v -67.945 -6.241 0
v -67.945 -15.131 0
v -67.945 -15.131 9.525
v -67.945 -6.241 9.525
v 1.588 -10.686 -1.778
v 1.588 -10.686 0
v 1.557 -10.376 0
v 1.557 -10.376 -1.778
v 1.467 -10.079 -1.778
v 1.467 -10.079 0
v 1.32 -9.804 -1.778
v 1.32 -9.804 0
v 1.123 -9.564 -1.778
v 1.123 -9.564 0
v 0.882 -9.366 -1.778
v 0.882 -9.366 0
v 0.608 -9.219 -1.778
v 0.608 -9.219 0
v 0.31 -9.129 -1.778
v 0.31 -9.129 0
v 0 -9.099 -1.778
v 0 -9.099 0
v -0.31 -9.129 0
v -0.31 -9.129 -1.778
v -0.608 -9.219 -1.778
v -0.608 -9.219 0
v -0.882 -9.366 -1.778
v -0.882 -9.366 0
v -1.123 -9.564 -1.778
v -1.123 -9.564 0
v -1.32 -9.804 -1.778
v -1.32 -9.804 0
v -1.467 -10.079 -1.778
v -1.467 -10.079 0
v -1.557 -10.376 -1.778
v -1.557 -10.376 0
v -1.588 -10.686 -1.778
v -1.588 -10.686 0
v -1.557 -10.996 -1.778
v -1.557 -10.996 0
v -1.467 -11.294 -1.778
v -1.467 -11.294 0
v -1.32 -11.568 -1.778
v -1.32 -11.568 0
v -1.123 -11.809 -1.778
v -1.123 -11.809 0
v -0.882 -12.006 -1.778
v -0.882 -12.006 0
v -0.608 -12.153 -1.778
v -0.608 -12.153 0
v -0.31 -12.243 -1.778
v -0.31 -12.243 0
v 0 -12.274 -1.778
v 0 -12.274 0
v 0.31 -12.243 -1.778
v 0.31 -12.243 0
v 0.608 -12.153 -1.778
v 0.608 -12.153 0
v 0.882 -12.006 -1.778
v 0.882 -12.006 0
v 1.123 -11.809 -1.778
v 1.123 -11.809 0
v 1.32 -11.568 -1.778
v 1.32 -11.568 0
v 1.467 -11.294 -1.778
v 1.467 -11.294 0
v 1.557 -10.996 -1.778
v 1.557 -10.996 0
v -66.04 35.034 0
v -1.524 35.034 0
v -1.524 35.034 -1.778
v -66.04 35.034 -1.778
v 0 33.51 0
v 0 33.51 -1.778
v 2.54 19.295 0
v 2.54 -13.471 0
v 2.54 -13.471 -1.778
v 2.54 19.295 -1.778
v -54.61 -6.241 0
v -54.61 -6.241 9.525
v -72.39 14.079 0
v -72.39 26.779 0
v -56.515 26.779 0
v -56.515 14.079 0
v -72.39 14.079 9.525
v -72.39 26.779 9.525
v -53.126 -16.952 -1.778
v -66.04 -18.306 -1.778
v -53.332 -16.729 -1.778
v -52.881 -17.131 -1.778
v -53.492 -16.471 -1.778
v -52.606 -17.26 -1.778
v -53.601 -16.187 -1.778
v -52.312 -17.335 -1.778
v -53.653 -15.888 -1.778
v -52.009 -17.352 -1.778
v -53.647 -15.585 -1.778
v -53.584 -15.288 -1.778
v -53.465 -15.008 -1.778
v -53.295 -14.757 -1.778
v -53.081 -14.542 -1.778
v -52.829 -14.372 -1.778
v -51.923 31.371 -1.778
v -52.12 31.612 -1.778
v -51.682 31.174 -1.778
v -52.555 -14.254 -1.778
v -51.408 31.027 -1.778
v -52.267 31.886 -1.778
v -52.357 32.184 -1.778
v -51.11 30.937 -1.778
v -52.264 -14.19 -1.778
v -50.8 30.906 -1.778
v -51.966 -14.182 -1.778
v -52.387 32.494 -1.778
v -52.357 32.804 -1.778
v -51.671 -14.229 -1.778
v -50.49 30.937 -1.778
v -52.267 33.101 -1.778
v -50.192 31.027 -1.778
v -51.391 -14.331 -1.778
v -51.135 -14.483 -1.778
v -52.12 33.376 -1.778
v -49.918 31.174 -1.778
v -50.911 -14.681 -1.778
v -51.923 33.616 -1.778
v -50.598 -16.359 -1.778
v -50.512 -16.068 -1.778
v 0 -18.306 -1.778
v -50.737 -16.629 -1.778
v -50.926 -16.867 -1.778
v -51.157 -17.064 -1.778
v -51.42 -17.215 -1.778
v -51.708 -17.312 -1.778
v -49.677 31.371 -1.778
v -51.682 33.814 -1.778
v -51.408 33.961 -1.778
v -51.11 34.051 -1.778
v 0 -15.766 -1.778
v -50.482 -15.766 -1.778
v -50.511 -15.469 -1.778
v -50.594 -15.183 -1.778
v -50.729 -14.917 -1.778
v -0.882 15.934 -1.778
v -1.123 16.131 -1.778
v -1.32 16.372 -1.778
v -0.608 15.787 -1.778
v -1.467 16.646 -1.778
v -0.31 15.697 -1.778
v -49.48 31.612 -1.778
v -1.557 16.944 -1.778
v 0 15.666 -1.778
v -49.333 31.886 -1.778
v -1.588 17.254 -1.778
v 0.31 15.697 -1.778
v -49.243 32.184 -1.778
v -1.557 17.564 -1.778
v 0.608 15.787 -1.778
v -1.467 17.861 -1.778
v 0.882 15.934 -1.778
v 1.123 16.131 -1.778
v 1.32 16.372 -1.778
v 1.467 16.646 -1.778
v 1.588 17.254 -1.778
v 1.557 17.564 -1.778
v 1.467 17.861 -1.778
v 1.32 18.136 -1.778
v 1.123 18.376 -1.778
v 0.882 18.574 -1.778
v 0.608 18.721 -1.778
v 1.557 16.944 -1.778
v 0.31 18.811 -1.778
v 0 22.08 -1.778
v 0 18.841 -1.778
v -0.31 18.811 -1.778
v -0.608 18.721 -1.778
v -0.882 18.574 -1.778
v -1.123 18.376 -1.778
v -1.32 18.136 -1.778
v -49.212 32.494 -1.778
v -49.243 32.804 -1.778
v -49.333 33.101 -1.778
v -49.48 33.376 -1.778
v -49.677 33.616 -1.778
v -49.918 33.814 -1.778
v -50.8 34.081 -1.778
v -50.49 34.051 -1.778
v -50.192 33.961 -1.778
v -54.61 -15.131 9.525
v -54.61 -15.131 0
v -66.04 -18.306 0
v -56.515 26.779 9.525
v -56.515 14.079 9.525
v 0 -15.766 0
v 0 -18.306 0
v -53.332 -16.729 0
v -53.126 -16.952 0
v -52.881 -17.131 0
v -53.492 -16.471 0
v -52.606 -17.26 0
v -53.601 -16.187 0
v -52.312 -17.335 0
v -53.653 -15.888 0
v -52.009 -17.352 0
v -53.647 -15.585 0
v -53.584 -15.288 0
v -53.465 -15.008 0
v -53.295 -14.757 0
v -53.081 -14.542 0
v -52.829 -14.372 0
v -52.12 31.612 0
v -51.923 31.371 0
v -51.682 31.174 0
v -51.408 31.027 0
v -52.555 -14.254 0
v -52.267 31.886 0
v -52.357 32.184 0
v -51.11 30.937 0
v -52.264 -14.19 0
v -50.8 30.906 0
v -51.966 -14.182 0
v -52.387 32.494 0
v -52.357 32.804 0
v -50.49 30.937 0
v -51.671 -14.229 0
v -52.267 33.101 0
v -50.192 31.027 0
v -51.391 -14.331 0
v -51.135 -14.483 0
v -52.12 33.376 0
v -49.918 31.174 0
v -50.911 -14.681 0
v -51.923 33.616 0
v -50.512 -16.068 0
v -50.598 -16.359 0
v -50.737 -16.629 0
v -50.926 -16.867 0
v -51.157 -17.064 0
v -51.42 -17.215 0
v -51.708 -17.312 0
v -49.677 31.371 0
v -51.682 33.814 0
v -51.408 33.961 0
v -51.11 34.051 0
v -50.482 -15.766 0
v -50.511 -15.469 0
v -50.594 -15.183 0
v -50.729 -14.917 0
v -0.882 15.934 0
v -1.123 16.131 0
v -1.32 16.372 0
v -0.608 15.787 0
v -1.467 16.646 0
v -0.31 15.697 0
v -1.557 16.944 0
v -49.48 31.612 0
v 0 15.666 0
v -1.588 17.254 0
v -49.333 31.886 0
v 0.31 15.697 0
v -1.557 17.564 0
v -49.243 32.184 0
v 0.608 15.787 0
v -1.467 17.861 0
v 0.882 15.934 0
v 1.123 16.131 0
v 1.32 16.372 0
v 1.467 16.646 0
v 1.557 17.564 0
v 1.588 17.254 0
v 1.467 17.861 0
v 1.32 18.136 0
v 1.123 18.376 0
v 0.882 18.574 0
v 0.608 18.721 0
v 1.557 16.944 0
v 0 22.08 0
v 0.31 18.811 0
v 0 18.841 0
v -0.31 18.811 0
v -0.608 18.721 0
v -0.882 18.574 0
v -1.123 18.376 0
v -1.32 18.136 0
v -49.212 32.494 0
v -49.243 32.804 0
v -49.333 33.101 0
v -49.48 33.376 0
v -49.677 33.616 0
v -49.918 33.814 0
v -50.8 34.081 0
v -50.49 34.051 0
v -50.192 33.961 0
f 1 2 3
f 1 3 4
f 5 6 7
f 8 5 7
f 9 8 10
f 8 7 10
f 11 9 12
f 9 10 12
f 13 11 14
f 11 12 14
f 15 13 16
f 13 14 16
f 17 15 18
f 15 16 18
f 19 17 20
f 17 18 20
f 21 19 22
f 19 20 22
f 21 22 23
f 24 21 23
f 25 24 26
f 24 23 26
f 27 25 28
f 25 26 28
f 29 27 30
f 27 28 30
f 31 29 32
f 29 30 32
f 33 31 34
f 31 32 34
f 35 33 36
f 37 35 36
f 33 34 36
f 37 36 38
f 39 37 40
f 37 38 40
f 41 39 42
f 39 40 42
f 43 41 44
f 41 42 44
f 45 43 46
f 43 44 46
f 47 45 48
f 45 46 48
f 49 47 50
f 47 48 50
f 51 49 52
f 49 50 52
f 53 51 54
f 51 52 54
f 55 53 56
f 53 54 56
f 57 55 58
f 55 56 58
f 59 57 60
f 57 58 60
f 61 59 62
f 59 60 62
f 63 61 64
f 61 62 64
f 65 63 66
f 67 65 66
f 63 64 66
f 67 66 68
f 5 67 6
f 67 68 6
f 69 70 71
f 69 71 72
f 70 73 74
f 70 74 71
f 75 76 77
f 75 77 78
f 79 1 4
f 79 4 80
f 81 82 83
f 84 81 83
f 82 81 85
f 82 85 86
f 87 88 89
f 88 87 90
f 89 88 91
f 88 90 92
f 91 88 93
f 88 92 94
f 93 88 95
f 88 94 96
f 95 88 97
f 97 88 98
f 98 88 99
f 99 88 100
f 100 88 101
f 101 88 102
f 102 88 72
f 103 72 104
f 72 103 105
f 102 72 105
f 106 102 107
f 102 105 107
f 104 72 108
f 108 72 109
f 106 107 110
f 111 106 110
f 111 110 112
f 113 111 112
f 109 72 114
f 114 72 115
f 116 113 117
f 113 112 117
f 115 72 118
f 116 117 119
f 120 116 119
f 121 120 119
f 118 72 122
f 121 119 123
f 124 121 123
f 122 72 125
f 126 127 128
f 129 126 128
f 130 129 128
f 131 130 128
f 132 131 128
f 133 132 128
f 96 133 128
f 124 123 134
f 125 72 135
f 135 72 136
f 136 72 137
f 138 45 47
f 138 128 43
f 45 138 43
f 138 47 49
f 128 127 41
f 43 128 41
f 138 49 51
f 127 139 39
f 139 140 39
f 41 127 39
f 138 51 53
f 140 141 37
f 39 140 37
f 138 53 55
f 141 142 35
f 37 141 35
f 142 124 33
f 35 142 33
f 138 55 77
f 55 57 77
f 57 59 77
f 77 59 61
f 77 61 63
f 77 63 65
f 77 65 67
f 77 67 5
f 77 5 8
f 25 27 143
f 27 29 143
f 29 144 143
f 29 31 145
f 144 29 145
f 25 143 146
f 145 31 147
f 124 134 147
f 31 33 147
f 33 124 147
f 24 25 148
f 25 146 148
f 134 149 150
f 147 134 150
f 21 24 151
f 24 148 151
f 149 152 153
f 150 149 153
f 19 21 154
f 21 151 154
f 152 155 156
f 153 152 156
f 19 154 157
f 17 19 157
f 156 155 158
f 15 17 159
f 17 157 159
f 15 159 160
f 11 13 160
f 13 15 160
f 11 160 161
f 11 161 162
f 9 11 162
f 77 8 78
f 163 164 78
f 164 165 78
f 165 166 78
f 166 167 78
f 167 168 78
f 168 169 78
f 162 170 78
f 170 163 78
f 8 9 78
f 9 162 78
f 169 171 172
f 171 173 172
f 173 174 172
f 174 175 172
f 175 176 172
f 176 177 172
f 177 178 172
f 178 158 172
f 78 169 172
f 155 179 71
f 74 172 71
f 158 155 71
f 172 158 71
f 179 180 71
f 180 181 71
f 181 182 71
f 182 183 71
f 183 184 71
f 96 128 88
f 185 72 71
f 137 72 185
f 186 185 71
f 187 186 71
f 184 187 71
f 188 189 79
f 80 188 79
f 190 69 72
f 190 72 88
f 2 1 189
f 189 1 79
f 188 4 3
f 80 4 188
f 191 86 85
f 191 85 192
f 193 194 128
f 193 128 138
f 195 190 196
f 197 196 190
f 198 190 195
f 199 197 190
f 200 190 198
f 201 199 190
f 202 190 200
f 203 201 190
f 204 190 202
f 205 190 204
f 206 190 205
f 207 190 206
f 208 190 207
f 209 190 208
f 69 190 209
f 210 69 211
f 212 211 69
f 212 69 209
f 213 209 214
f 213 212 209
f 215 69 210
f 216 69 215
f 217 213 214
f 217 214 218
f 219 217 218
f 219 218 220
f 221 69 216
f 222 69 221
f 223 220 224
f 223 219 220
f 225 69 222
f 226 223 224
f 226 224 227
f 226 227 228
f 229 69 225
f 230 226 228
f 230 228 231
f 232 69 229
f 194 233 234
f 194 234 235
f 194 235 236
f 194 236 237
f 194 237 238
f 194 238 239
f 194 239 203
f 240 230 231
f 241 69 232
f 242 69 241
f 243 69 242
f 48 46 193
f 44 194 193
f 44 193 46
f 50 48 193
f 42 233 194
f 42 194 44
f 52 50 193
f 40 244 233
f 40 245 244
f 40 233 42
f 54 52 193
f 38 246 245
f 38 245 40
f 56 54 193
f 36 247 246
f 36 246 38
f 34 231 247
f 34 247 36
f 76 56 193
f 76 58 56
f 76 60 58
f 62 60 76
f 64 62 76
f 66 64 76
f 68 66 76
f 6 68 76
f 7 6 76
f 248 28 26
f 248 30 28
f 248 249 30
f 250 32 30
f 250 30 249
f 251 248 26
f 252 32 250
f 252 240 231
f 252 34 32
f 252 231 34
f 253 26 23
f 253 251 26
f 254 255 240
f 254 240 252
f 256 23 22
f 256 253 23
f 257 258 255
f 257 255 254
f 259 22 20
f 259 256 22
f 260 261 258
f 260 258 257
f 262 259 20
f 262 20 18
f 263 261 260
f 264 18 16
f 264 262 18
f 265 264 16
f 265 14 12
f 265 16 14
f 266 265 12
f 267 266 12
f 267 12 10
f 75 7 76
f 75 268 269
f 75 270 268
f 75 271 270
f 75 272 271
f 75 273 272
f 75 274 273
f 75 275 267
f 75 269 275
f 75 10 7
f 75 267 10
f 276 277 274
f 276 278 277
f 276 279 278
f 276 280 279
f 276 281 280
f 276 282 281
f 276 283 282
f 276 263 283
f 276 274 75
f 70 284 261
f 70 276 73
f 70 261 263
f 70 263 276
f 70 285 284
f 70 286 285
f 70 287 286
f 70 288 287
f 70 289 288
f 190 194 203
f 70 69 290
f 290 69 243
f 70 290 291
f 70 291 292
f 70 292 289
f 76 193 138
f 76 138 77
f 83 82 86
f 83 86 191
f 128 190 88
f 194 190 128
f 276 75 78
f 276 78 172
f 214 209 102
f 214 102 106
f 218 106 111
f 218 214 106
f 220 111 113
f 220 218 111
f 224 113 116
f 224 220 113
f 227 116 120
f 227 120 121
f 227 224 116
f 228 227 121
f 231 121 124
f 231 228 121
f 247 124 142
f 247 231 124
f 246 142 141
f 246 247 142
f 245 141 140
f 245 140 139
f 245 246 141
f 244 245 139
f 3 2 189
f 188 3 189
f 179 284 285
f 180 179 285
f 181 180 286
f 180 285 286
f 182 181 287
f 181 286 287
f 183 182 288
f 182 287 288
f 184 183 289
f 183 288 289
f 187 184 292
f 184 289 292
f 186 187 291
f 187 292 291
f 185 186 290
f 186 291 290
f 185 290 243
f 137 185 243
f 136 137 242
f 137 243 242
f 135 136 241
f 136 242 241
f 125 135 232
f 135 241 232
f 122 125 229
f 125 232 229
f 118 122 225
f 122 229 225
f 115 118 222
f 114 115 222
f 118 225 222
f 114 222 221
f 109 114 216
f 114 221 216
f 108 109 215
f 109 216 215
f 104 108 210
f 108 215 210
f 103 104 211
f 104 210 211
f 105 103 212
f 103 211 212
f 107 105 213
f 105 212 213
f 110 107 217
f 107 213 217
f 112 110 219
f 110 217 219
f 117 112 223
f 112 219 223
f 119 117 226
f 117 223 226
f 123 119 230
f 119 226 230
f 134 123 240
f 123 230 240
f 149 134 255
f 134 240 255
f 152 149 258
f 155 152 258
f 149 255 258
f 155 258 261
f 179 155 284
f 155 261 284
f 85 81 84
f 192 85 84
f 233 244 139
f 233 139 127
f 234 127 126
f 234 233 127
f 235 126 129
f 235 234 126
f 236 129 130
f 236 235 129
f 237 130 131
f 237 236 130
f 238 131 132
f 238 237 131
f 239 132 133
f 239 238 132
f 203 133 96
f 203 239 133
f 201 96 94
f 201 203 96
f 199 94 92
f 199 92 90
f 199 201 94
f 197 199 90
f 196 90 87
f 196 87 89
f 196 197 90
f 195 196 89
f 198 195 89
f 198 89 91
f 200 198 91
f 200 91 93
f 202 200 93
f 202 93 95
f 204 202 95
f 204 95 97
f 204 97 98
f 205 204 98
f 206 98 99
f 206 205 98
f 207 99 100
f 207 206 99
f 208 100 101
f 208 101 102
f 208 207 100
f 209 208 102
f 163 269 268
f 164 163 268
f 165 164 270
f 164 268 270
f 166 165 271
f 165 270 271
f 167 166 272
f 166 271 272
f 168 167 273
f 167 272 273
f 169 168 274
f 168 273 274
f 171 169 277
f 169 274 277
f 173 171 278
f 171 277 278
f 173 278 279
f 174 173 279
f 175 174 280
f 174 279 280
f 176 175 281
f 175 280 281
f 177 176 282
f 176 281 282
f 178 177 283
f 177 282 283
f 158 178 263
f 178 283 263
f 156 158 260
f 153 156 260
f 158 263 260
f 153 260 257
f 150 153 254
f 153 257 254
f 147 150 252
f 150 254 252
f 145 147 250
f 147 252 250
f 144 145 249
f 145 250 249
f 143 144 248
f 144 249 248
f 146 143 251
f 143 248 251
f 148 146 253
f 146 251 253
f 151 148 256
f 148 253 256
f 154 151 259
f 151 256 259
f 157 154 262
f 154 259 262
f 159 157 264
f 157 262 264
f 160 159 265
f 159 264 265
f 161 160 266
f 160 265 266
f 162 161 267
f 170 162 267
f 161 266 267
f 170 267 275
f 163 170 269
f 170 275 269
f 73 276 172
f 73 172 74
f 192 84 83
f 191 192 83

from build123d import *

# Parameters (mm, degrees)
F1_W     = 15.875
F1_H     = 12.7
F2_DEPTH = 9.525
F1_W_2   = 13.335
F1_H_2   = 8.89
F0_R     = 1.5875
F3_DEPTH = 1.778


with BuildPart() as f2:
    # F1 (on Top) → F2 (new body)
    with BuildSketch(Plane.XY):
        with Locations((-64.4525, 20.4289640361)):
            Rectangle(F1_W, F1_H)
    extrude(amount=F2_DEPTH)


with BuildPart() as f2b:
    # F1 (on Top) → F2, piece 2 (new body)
    with BuildSketch(Plane.XY):
        with Locations((-61.2775, -10.6860359639)):
            Rectangle(F1_W_2, F1_H_2)
    extrude(amount=F2_DEPTH)


with BuildPart() as f3:
    # F0 (on Top) → F3 (new body)
    with BuildSketch(Plane.XY):
        Polygon((-66.04, 35.0339640361), (-66.04, -18.3060359639), (-5.7715834118, -18.3060359639), (0, -18.3060359639), (0, -15.7660359639), (2.54, -13.4714379648), (2.54, 19.2945620352), (0, 22.0799640361), (0, 33.5099640361), (-1.524, 35.0339640361), align=None)
        with BuildLine():
            ThreePointArc((-52.8291677684, -14.3718263134), (-51.2591432254, -14.4012401765), (-50.4825, -15.7660359639))
            ThreePointArc((-50.4825, -15.7660359639), (-52.8808567746, -17.1308317512), (-52.8291677684, -14.3718263134))
        make_face(mode=Mode.SUBTRACT)
        with Locations((0, -10.6860359639)):
            Circle(F0_R, mode=Mode.SUBTRACT)
        with Locations((-50.8, 32.4939640361)):
            Circle(F0_R, mode=Mode.SUBTRACT)
        with Locations((0, 17.2539640361)):
            Circle(F0_R, mode=Mode.SUBTRACT)
    extrude(amount=-F3_DEPTH)


solid = Compound([f2.part, f2b.part, f3.part])
